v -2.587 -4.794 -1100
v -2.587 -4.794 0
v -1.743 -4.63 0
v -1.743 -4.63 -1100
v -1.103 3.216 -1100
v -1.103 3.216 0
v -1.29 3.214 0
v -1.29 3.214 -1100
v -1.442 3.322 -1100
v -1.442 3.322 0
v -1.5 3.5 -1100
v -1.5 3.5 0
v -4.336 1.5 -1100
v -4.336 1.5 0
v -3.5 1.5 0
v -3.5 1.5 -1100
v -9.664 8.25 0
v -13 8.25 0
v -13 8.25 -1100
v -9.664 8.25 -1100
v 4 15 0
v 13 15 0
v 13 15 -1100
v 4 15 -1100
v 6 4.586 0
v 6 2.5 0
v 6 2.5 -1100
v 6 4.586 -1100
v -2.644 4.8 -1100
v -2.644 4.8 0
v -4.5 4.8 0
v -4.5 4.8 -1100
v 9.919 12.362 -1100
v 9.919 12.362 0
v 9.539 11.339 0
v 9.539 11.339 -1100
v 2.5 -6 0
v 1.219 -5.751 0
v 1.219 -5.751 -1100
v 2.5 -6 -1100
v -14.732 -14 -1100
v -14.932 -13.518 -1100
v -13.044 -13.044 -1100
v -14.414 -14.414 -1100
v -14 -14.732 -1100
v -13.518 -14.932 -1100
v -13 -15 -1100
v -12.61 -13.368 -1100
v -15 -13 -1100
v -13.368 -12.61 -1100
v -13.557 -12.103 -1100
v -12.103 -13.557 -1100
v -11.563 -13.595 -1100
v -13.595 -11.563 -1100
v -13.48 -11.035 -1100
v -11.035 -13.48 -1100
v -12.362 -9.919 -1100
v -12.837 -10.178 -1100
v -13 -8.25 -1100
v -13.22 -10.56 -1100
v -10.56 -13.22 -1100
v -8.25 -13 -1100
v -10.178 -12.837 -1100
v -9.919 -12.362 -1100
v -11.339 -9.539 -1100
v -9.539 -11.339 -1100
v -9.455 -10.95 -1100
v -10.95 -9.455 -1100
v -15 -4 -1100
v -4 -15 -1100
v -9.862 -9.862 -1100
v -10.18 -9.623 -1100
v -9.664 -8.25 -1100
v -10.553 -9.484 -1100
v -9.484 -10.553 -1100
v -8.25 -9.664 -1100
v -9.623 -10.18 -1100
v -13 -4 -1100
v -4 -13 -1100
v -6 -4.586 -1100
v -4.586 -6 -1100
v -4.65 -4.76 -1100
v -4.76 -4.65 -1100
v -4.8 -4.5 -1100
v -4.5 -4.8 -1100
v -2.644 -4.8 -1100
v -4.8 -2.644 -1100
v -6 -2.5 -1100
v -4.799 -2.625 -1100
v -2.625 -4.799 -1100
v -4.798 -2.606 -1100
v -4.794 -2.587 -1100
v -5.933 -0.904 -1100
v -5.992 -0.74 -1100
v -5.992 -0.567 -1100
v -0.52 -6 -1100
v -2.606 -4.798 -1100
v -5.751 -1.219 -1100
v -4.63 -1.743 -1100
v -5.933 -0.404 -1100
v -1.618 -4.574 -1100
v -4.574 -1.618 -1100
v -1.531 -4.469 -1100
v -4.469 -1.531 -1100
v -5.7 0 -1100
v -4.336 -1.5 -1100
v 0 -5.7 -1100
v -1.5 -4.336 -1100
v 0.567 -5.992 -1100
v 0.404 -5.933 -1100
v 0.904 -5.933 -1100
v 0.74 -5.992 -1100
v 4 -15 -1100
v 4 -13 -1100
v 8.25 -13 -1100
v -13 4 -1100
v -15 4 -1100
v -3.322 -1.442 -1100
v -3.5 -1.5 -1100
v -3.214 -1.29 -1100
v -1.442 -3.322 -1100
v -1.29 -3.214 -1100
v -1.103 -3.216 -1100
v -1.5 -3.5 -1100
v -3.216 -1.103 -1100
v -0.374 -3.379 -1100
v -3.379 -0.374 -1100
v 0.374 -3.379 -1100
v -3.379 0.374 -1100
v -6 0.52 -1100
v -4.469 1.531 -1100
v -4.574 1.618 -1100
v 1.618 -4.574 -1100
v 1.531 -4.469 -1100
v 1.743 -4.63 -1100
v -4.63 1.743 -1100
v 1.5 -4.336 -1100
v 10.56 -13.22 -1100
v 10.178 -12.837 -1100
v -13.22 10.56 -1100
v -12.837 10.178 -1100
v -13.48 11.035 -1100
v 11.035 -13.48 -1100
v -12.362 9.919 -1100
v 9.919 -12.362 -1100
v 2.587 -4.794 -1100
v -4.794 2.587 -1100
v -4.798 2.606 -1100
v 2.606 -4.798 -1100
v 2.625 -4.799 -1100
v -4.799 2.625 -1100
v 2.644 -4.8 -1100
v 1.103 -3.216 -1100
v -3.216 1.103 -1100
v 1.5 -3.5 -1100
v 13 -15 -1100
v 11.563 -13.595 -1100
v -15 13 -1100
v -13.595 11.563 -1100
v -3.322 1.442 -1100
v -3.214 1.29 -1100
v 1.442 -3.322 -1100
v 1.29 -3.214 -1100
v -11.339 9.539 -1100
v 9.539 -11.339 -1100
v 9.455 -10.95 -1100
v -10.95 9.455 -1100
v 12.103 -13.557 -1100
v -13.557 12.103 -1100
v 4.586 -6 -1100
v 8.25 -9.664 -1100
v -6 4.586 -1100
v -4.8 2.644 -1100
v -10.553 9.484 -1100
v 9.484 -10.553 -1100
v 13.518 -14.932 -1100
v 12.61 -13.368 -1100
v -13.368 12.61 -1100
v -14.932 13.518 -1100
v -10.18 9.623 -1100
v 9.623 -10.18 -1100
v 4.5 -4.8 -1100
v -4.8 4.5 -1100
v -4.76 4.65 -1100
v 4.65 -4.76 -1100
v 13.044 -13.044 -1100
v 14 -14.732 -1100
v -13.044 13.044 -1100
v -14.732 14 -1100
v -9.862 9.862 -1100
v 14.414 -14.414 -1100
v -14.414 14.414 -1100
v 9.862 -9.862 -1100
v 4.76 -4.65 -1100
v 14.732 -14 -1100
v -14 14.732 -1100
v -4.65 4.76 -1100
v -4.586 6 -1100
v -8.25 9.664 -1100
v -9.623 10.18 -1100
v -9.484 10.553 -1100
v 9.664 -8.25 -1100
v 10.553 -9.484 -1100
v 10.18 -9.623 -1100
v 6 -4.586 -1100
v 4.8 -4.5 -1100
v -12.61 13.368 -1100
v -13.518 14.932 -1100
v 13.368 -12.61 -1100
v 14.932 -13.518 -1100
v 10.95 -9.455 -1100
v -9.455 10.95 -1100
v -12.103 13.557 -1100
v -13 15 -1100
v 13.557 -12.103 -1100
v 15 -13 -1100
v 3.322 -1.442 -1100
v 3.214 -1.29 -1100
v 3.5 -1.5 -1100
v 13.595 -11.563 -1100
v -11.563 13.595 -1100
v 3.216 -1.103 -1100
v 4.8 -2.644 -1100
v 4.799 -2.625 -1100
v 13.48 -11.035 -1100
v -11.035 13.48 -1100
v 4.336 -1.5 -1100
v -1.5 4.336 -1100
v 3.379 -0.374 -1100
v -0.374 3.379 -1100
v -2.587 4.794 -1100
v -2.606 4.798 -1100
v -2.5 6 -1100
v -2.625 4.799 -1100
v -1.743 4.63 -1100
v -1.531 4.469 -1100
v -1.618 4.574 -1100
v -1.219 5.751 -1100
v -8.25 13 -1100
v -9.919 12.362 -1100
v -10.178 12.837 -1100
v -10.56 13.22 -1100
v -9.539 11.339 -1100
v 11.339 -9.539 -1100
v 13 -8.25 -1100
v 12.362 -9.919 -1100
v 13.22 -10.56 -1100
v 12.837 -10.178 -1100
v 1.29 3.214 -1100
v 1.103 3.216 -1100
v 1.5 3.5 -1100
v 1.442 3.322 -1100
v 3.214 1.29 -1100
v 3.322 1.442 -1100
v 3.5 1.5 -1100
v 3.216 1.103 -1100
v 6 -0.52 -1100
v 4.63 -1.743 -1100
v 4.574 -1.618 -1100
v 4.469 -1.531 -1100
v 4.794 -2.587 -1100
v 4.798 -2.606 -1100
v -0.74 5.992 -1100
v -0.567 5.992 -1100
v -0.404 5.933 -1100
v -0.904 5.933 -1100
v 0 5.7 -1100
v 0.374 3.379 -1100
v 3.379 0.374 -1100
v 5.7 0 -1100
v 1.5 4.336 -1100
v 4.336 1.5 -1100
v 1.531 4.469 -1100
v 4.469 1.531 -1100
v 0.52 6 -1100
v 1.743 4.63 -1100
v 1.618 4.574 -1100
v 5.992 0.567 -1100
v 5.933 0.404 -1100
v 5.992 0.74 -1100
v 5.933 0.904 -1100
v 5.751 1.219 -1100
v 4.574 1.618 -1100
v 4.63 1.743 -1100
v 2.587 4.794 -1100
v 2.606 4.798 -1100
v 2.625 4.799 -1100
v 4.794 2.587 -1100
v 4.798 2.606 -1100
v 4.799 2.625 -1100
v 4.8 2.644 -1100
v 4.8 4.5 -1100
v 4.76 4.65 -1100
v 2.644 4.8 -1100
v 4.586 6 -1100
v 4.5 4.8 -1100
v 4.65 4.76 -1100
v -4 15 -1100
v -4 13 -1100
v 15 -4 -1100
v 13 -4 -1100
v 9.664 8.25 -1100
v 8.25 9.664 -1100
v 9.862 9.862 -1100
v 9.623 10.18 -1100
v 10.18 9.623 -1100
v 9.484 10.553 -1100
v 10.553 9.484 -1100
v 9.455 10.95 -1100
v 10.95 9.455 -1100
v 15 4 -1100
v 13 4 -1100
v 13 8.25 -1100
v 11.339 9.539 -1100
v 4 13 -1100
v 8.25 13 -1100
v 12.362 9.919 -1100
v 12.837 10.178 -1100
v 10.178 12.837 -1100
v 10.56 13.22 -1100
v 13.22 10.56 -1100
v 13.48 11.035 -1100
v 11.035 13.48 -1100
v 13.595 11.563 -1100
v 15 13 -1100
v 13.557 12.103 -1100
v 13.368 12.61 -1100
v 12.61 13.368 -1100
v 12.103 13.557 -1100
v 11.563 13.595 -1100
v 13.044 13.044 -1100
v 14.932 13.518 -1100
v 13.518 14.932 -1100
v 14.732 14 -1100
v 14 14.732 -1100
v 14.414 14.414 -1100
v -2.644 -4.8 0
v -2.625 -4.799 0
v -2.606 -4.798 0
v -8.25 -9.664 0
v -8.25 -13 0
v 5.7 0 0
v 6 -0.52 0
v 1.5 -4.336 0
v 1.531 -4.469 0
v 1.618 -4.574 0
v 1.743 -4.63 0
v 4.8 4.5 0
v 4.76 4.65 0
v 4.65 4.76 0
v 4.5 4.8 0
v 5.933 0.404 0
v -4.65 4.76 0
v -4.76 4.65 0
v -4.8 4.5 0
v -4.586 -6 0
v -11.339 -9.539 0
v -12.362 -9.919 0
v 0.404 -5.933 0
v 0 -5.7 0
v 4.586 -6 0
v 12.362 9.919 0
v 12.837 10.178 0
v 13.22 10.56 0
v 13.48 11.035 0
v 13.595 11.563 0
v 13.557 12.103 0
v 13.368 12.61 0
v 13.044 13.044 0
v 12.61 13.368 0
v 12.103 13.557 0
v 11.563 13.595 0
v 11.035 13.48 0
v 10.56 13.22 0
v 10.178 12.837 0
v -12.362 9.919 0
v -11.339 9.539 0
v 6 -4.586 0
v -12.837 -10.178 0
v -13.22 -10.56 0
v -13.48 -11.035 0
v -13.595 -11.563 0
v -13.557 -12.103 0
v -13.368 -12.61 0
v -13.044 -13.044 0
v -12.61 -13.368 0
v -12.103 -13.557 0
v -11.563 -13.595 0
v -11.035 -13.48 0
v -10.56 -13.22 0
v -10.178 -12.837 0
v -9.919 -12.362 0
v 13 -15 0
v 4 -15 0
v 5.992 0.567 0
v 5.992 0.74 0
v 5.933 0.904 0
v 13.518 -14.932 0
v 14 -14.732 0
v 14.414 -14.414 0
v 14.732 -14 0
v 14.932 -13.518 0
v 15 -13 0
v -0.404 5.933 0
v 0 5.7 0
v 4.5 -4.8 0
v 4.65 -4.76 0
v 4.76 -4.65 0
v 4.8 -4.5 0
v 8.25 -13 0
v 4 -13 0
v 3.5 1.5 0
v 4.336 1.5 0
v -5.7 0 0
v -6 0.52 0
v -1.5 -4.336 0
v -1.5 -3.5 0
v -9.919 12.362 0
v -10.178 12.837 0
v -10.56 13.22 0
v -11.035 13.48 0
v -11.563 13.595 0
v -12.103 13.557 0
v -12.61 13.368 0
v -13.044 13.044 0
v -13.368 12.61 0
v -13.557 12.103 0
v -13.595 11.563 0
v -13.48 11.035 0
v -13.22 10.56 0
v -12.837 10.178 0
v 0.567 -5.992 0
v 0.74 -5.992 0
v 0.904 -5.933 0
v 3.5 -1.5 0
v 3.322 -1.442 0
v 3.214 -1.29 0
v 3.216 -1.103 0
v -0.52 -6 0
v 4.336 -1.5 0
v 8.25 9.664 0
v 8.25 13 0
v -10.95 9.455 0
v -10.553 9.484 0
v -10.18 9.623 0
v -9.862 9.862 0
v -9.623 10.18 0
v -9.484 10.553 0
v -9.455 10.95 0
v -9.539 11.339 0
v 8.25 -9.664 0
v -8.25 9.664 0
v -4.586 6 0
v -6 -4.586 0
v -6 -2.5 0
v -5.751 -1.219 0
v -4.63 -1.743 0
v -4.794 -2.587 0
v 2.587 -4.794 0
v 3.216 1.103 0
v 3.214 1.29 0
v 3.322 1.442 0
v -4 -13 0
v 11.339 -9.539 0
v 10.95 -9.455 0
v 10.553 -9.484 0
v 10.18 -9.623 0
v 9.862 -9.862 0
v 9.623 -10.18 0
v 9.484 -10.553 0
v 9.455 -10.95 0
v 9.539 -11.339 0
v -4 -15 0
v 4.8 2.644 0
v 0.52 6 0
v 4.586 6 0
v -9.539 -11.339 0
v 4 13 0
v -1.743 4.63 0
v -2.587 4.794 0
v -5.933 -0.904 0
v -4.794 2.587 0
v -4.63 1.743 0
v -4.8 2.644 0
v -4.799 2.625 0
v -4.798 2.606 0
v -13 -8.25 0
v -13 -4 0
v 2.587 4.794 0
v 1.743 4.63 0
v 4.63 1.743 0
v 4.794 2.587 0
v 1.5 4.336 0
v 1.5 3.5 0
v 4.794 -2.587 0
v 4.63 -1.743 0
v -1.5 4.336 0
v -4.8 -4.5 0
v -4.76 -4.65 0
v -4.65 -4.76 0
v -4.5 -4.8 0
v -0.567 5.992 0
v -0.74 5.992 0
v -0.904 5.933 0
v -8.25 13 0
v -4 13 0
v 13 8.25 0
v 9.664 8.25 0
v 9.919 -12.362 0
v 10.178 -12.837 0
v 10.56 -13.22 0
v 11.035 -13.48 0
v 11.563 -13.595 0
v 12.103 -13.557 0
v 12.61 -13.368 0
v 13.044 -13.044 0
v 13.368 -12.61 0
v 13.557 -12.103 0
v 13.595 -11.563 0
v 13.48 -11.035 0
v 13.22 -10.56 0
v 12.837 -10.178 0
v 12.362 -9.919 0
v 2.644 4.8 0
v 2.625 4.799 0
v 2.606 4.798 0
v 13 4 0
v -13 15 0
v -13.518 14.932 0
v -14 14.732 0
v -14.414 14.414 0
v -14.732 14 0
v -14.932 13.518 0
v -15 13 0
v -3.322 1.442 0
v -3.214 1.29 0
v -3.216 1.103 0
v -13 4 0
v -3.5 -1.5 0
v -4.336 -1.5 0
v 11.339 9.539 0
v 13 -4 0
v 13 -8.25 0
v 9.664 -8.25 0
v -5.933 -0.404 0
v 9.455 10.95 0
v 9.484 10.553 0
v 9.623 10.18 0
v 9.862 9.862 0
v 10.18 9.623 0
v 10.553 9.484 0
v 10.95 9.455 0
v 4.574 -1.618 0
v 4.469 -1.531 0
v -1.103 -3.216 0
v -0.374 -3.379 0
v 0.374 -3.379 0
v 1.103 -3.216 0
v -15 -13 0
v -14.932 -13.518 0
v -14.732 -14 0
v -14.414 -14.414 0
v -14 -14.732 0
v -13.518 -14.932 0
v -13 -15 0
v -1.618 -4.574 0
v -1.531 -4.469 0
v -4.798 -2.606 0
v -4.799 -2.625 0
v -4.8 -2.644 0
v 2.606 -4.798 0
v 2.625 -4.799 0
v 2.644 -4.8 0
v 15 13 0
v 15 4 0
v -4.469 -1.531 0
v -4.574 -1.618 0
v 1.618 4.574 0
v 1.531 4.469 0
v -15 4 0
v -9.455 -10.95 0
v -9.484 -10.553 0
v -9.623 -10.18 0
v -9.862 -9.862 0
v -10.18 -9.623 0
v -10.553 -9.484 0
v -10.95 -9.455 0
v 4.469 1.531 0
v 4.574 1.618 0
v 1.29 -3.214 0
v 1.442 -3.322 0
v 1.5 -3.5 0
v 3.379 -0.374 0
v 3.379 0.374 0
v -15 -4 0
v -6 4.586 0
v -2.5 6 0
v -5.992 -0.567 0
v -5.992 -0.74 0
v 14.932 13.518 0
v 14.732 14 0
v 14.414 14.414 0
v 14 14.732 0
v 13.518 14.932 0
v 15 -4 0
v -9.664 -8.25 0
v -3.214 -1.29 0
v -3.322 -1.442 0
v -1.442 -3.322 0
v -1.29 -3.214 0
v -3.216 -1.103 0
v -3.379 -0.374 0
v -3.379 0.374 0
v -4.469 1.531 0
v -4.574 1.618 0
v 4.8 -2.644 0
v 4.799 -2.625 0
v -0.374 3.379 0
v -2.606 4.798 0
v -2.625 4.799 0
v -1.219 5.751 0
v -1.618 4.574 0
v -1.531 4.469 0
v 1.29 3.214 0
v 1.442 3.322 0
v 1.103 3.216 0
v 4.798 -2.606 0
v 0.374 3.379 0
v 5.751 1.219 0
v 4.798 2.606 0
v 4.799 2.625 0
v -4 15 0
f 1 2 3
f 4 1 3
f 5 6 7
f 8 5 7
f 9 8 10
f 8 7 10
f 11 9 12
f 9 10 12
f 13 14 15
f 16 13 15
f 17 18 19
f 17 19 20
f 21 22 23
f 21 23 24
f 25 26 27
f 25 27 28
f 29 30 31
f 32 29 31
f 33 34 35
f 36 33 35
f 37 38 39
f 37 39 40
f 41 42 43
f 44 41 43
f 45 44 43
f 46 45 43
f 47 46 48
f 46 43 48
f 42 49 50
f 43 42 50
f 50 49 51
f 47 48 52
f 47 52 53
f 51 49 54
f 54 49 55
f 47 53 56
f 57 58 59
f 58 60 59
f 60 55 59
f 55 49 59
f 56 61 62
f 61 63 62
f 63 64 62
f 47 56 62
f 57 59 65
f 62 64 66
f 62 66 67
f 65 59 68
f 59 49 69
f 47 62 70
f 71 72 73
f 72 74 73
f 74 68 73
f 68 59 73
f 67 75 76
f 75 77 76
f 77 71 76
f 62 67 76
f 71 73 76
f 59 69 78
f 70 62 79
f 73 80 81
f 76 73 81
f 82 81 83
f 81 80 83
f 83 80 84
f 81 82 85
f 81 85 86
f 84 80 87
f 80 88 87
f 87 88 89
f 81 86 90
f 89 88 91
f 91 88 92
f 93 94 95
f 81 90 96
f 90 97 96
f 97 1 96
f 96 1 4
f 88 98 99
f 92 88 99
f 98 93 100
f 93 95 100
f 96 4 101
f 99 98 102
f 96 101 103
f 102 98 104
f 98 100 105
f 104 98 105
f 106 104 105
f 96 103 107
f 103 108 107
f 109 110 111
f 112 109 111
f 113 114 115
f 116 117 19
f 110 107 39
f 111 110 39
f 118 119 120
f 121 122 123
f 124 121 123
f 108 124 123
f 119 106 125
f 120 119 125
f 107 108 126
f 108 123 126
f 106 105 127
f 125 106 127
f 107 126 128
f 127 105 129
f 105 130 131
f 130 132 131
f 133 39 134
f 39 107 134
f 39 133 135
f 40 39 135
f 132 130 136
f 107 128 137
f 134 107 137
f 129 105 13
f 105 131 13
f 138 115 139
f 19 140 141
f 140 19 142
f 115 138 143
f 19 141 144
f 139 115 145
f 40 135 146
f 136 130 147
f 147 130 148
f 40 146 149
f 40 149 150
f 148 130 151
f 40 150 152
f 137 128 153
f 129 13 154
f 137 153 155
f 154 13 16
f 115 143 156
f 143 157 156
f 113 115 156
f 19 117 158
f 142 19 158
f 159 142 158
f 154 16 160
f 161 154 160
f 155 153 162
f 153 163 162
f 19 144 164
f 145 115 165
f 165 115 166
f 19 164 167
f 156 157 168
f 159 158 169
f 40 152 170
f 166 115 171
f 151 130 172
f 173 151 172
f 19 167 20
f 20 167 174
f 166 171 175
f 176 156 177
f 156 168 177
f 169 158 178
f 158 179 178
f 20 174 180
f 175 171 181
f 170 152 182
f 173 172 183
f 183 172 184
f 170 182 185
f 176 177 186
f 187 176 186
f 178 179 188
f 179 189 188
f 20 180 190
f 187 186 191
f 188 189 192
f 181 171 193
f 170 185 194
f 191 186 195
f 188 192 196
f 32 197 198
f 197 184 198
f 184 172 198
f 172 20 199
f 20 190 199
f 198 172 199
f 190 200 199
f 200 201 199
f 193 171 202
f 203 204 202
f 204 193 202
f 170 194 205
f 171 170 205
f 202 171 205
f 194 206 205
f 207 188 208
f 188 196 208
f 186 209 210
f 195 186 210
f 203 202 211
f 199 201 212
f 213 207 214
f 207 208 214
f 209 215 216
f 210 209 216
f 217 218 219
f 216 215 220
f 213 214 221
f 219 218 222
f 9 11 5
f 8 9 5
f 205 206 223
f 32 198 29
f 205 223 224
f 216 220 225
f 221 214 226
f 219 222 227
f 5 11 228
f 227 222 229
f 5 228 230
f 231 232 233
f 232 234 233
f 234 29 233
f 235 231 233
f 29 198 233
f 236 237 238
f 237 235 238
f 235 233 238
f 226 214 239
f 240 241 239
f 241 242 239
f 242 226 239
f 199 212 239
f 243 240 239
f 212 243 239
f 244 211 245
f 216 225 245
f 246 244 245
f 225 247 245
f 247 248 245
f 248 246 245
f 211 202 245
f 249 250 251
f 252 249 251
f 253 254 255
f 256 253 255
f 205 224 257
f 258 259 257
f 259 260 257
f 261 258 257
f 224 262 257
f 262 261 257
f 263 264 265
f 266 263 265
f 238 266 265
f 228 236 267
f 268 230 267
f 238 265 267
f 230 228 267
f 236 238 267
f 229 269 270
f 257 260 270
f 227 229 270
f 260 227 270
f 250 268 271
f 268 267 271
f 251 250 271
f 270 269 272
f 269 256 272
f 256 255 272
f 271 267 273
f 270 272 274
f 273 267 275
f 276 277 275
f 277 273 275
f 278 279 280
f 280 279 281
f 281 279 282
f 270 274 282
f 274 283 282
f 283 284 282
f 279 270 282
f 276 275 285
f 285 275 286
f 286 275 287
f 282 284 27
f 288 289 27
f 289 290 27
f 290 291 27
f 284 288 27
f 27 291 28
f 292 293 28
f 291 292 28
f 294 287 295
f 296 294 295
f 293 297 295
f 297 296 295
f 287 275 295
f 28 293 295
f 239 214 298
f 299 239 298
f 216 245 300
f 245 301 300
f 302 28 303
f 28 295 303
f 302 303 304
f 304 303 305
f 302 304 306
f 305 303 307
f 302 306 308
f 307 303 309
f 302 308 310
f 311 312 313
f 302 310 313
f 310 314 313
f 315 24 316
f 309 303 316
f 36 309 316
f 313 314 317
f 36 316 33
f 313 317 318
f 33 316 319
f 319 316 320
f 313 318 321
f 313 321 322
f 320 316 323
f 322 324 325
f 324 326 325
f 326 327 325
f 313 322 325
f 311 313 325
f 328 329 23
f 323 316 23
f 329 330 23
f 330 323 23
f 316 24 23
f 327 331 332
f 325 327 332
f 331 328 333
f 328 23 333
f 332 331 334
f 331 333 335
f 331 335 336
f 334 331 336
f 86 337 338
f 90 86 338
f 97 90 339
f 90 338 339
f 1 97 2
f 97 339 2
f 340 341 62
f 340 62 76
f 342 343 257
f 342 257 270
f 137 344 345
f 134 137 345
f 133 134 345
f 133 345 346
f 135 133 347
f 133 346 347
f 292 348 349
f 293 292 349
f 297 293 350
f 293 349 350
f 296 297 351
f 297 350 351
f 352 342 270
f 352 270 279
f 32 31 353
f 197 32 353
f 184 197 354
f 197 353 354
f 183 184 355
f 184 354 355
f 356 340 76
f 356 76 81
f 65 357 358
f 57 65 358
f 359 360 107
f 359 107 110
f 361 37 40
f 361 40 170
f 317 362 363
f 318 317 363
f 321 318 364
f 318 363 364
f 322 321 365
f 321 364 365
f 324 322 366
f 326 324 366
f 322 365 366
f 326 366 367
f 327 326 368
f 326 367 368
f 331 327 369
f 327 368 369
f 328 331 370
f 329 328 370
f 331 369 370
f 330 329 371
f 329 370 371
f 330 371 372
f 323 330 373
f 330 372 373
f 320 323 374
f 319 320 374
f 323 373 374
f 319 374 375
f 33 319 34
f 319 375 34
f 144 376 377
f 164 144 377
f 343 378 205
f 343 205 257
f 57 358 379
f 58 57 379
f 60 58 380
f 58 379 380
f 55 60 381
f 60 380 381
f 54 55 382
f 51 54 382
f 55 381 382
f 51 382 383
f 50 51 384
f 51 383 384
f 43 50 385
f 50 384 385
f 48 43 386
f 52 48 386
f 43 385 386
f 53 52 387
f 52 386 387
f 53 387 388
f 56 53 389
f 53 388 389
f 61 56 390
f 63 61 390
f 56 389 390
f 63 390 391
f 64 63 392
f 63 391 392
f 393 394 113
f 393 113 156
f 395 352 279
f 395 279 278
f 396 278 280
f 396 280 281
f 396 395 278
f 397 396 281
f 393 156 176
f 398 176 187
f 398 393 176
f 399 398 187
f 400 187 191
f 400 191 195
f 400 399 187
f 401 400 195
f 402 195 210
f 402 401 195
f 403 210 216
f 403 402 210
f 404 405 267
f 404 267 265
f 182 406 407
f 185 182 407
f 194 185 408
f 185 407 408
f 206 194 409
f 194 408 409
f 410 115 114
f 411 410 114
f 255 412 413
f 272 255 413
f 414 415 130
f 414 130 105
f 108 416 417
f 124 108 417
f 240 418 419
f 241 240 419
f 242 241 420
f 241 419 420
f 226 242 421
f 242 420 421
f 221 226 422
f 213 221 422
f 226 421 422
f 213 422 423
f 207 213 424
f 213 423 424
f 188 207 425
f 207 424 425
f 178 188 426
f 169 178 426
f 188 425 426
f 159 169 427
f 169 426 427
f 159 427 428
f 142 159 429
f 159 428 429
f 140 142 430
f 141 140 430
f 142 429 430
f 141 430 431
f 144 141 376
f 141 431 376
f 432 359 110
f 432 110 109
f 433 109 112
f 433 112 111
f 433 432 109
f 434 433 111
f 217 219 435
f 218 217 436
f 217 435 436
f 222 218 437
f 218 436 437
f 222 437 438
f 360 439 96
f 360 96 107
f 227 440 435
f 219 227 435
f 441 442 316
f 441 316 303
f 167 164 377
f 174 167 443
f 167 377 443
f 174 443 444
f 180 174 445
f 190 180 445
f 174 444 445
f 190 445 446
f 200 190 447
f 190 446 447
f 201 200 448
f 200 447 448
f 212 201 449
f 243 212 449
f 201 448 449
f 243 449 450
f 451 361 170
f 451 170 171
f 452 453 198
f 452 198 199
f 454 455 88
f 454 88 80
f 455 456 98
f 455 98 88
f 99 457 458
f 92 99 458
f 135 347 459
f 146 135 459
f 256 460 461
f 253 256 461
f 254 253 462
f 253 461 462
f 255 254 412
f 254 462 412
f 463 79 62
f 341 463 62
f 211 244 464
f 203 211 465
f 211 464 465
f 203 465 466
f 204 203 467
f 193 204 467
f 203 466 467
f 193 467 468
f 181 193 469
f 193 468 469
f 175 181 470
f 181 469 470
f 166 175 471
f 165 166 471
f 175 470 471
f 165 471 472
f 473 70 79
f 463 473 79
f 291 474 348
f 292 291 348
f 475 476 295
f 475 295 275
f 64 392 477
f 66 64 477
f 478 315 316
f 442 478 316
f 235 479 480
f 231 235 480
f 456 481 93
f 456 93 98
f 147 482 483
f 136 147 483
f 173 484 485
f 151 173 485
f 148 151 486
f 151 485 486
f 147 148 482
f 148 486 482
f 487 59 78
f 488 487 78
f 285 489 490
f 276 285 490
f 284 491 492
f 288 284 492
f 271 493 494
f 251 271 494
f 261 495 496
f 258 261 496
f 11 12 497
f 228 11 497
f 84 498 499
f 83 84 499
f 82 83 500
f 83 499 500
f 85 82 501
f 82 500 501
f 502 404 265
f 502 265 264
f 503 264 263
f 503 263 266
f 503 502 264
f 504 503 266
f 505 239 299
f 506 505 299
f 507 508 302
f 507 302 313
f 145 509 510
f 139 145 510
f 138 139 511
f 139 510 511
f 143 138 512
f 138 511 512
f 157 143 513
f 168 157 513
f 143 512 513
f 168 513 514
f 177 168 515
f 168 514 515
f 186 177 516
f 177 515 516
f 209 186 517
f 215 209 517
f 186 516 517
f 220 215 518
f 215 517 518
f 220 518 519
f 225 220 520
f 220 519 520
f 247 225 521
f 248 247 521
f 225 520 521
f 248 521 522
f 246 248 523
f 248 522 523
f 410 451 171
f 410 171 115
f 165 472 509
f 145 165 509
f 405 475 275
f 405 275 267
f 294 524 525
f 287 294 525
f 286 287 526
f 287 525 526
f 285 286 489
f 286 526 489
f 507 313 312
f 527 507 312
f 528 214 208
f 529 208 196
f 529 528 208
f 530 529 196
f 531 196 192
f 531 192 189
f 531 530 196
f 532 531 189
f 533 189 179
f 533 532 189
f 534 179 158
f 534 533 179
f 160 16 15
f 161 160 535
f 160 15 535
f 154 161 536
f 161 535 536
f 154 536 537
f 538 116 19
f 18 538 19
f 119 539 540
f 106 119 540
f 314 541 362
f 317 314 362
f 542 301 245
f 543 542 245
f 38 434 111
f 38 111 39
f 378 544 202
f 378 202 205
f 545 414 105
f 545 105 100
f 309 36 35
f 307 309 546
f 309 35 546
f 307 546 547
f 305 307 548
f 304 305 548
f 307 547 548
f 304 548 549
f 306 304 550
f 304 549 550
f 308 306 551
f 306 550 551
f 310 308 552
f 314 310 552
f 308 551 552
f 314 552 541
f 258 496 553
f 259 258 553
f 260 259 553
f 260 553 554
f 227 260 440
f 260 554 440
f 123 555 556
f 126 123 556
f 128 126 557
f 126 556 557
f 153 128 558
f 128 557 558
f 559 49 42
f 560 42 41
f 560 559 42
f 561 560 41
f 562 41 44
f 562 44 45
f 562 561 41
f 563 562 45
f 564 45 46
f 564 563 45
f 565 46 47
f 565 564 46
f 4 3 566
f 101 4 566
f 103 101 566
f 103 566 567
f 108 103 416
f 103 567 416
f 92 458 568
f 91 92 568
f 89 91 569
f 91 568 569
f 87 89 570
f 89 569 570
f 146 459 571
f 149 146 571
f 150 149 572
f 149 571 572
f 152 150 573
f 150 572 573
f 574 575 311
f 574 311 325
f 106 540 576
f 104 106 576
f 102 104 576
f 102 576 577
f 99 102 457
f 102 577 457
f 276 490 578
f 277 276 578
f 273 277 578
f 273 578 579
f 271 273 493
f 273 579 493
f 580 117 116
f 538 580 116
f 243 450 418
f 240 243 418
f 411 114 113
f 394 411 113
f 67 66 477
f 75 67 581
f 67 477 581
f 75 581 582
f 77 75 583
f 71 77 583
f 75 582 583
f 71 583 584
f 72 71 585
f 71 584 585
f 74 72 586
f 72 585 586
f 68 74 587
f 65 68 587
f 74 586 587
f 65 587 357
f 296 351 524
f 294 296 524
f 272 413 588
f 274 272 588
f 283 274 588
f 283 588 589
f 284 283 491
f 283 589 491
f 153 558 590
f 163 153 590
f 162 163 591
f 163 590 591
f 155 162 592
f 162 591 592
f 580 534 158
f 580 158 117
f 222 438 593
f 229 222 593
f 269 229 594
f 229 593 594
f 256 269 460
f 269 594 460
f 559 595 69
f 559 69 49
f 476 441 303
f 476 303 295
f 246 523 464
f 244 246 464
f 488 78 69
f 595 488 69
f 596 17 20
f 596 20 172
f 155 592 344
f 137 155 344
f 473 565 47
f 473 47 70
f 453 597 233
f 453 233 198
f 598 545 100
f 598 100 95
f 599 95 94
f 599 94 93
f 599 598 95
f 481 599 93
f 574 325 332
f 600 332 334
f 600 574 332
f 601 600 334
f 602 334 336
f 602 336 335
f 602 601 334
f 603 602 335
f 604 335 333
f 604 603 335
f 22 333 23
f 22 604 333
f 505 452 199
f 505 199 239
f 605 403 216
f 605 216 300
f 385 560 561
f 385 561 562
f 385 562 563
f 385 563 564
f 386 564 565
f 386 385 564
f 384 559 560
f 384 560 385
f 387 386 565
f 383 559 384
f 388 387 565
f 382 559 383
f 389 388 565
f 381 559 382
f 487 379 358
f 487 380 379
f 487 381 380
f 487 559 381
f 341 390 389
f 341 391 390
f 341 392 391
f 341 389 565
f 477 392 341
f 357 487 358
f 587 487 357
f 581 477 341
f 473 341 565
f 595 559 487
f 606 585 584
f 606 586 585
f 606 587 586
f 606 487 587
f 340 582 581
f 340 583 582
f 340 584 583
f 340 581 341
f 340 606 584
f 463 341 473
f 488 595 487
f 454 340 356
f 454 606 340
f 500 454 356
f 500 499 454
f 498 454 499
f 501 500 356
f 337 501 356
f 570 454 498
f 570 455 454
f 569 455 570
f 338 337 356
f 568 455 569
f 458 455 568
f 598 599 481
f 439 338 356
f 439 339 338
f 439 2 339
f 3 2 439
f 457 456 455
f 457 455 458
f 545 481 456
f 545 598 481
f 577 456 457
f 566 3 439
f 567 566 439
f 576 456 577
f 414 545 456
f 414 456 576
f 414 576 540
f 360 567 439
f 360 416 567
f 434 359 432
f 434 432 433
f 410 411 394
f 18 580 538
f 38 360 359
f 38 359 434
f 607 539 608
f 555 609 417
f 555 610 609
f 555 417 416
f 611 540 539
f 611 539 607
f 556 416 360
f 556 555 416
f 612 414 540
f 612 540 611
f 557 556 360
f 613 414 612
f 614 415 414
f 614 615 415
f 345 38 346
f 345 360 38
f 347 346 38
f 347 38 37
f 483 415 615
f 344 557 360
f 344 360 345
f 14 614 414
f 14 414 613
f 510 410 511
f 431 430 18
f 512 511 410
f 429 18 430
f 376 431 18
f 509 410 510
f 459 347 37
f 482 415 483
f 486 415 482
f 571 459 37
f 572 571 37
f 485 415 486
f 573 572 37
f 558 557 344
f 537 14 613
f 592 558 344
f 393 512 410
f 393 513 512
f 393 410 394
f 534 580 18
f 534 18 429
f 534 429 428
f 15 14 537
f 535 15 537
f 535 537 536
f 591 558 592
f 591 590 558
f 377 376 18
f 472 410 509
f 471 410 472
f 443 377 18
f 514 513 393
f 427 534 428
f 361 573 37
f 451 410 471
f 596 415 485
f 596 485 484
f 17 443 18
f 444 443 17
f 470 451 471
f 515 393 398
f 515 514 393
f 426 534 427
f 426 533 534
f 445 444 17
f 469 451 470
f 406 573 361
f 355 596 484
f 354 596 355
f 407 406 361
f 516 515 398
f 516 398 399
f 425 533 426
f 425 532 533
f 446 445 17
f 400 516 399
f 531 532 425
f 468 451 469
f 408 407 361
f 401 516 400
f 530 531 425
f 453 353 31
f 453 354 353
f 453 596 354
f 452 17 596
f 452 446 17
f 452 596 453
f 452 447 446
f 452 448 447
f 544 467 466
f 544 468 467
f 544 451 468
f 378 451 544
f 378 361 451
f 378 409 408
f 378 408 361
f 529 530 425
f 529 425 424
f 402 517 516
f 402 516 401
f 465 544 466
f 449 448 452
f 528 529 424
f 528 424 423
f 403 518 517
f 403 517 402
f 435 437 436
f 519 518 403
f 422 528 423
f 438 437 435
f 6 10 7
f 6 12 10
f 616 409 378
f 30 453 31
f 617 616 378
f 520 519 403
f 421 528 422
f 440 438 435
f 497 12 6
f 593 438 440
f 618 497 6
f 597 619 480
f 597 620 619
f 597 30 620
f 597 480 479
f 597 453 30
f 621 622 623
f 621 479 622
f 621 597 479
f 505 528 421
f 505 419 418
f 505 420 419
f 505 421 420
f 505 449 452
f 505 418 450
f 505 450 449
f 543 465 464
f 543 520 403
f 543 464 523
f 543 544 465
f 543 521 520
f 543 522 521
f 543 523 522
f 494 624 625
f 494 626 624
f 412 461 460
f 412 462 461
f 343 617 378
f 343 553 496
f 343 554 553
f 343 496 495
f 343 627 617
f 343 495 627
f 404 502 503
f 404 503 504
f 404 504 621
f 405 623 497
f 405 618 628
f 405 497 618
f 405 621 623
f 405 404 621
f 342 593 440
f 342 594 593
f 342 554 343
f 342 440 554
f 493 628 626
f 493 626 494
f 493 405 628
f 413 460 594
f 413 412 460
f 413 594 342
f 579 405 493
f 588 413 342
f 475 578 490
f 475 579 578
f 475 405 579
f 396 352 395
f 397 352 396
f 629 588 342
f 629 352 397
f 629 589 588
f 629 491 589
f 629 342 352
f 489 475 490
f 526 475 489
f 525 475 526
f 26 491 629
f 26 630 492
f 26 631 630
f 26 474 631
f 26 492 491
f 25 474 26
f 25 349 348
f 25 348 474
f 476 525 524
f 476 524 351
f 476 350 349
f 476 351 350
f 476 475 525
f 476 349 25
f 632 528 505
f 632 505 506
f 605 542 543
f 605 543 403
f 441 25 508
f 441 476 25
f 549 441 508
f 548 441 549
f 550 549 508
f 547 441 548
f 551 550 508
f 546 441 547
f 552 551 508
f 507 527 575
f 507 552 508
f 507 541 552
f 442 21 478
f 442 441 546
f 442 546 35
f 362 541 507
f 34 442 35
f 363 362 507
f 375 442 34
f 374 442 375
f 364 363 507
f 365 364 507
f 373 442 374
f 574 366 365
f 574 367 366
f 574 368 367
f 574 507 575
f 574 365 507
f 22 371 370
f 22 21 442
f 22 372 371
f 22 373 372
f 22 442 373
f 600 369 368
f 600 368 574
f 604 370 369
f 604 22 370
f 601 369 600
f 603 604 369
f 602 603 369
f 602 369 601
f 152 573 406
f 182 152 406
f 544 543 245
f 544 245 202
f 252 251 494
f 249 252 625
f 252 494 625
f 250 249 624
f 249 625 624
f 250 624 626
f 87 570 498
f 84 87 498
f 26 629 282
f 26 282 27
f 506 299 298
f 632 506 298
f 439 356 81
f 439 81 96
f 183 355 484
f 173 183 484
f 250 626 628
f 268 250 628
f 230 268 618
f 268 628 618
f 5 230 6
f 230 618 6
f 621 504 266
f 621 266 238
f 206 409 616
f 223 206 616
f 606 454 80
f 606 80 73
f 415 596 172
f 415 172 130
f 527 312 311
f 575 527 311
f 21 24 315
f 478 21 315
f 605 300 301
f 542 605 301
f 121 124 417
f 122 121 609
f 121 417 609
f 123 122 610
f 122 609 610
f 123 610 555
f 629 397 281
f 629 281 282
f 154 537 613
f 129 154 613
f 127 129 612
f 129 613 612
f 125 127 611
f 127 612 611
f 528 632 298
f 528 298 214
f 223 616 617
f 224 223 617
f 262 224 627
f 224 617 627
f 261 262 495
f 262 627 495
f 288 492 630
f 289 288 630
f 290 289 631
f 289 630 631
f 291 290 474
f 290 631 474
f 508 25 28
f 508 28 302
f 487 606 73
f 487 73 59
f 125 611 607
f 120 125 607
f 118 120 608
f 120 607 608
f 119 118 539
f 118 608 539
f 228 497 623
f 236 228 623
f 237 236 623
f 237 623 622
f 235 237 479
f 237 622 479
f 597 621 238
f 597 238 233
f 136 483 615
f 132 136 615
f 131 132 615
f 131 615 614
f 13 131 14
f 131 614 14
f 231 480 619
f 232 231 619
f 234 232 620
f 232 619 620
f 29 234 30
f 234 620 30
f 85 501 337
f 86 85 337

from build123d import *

# Parameters (mm, degrees)
BOSS_EXTRUDE1_DEPTH = 1100
CUT_EXTRUDE1_DEPTH  = 1101.20452644


with BuildPart() as part:
    # Sketch1 → Boss-Extrude1 (new body)
    with BuildSketch(Plane.XY):
        with BuildLine():
            Line((-15, 4), (-13, 4))
            Line((-13, 4), (-13, 8.25))
            Line((-13, 8.25), (-9.664213562, 8.25))
            Line((-9.664213562, 8.25), (-6, 4.585786438))
            Line((-6, 4.585786438), (-6, 0.519615242))
            Line((-6, 0.519615242), (-5.7, 0))
            Line((-5.7, 0), (-5.933012702, -0.403589838))
            ThreePointArc((-5.933012702, -0.403589838), (-6, -0.653589838), (-5.933012702, -0.903589838))
            Line((-5.933012702, -0.903589838), (-5.750976592, -1.218885629))
            Line((-5.750976592, -1.218885629), (-6, -2.5))
            Line((-6, -2.5), (-6, -4.585786438))
            Line((-6, -4.585786438), (-9.664213562, -8.25))
            Line((-9.664213562, -8.25), (-13, -8.25))
            Line((-13, -8.25), (-13, -4))
            Line((-13, -4), (-15, -4))
            Line((-15, -4), (-15, -13))
            ThreePointArc((-15, -13), (-14.414213562, -14.414213562), (-13, -15))
            Line((-13, -15), (-4, -15))
            Line((-4, -15), (-4, -13))
            Line((-4, -13), (-8.25, -13))
            Line((-8.25, -13), (-8.25, -9.664213562))
            Line((-8.25, -9.664213562), (-4.585786438, -6))
            Line((-4.585786438, -6), (-0.519615242, -6))
            Line((-0.519615242, -6), (0, -5.7))
            Line((0, -5.7), (0.403589838, -5.933012702))
            ThreePointArc((0.403589838, -5.933012702), (0.653589838, -6), (0.903589838, -5.933012702))
            Line((0.903589838, -5.933012702), (1.218885629, -5.750976592))
            Line((1.218885629, -5.750976592), (2.5, -6))
            Line((2.5, -6), (4.585786438, -6))
            Line((4.585786438, -6), (8.25, -9.664213562))
            Line((8.25, -9.664213562), (8.25, -13))
            Line((8.25, -13), (4, -13))
            Line((4, -13), (4, -15))
            Line((4, -15), (13, -15))
            ThreePointArc((13, -15), (14.414213562, -14.414213562), (15, -13))
            Line((15, -13), (15, -4))
            Line((15, -4), (13, -4))
            Line((13, -4), (13, -8.25))
            Line((13, -8.25), (9.664213562, -8.25))
            Line((9.664213562, -8.25), (6, -4.585786438))
            Line((6, -4.585786438), (6, -0.519615242))
            Line((6, -0.519615242), (5.7, 0))
            Line((5.7, 0), (5.933012702, 0.403589838))
            ThreePointArc((5.933012702, 0.403589838), (6, 0.653589838), (5.933012702, 0.903589838))
            Line((5.933012702, 0.903589838), (5.750976592, 1.218885629))
            Line((5.750976592, 1.218885629), (6, 2.5))
            Line((6, 2.5), (6, 4.585786438))
            Line((6, 4.585786438), (9.664213562, 8.25))
            Line((9.664213562, 8.25), (13, 8.25))
            Line((13, 8.25), (13, 4))
            Line((13, 4), (15, 4))
            Line((15, 4), (15, 13))
            ThreePointArc((15, 13), (14.414213562, 14.414213562), (13, 15))
            Line((13, 15), (4, 15))
            Line((4, 15), (4, 13))
            Line((4, 13), (8.25, 13))
            Line((8.25, 13), (8.25, 9.664213562))
            Line((8.25, 9.664213562), (4.585786438, 6))
            Line((4.585786438, 6), (0.519615242, 6))
            Line((0.519615242, 6), (0, 5.7))
            Line((0, 5.7), (-0.403589838, 5.933012702))
            ThreePointArc((-0.403589838, 5.933012702), (-0.653589838, 6), (-0.903589838, 5.933012702))
            Line((-0.903589838, 5.933012702), (-1.218885629, 5.750976592))
            Line((-1.218885629, 5.750976592), (-2.5, 6))
            Line((-2.5, 6), (-4.585786438, 6))
            Line((-4.585786438, 6), (-8.25, 9.664213562))
            Line((-8.25, 9.664213562), (-8.25, 13))
            Line((-8.25, 13), (-4, 13))
            Line((-4, 13), (-4, 15))
            Line((-4, 15), (-13, 15))
            ThreePointArc((-13, 15), (-14.414213562, 14.414213562), (-15, 13))
            Line((-15, 13), (-15, 4))
        make_face()
        with BuildLine():
            Line((11.338915743, 9.539070071), (12.361530981, 9.918883282))
            ThreePointArc((12.361530981, 9.918883282), (13.043502884, 13.043502884), (9.918883282, 12.361530981))
            Line((9.918883282, 12.361530981), (9.539070071, 11.338915743))
            ThreePointArc((9.539070071, 11.338915743), (9.861522369, 9.861522369), (11.338915743, 9.539070071))
        make_face(mode=Mode.SUBTRACT)
        with BuildLine():
            Line((9.539070071, -11.338915743), (9.918883282, -12.361530981))
            ThreePointArc((9.918883282, -12.361530981), (13.043502884, -13.043502884), (12.361530981, -9.918883282))
            Line((12.361530981, -9.918883282), (11.338915743, -9.539070071))
            ThreePointArc((11.338915743, -9.539070071), (9.861522369, -9.861522369), (9.539070071, -11.338915743))
        make_face(mode=Mode.SUBTRACT)
        with BuildLine():
            Line((-12.361530981, 9.918883282), (-11.338915743, 9.539070071))
            ThreePointArc((-11.338915743, 9.539070071), (-9.861522369, 9.861522369), (-9.539070071, 11.338915743))
            Line((-9.539070071, 11.338915743), (-9.918883282, 12.361530981))
            ThreePointArc((-9.918883282, 12.361530981), (-13.043502884, 13.043502884), (-12.361530981, 9.918883282))
        make_face(mode=Mode.SUBTRACT)
        with BuildLine():
            Line((-9.918883282, -12.361530981), (-9.539070071, -11.338915743))
            ThreePointArc((-9.539070071, -11.338915743), (-9.861522369, -9.861522369), (-11.338915743, -9.539070071))
            Line((-11.338915743, -9.539070071), (-12.361530981, -9.918883282))
            ThreePointArc((-12.361530981, -9.918883282), (-13.043502884, -13.043502884), (-9.918883282, -12.361530981))
        make_face(mode=Mode.SUBTRACT)
    extrude(amount=-BOSS_EXTRUDE1_DEPTH)

    # Sketch2 → Cut-Extrude1 (cut, through all)
    with BuildSketch(Plane.XY):
        with BuildLine():
            Line((-4.5, -4.8), (-2.644433572, -4.8))
            ThreePointArc((-2.644433572, -4.8), (-2.615679847, -4.79861886), (-2.587190874, -4.794488155))
            Line((-2.587190874, -4.794488155), (-1.742757301, -4.630346896))
            ThreePointArc((-1.742757301, -4.630346896), (-1.568512625, -4.526682207), (-1.5, -4.335858741))
            Line((-1.5, -4.335858741), (-1.5, -3.5))
            ThreePointArc((-1.5, -3.5), (-1.374371466, -3.255879964), (-1.10270272, -3.21621621))
            ThreePointArc((-1.10270272, -3.21621621), (-9e-09, -3.4), (1.102702703, -3.216216216))
            ThreePointArc((1.102702703, -3.216216216), (1.374371458, -3.255879959), (1.5, -3.5))
            Line((1.5, -3.5), (1.5, -4.335858741))
            ThreePointArc((1.5, -4.335858741), (1.568512625, -4.526682207), (1.742757301, -4.630346896))
            Line((1.742757301, -4.630346896), (2.587190874, -4.794488155))
            ThreePointArc((2.587190874, -4.794488155), (2.615679847, -4.79861886), (2.644433572, -4.8))
            Line((2.644433572, -4.8), (4.5, -4.8))
            ThreePointArc((4.5, -4.8), (4.712132034, -4.712132034), (4.8, -4.5))
            Line((4.8, -4.5), (4.8, -2.644433572))
            ThreePointArc((4.8, -2.644433572), (4.79861886, -2.615679847), (4.794488155, -2.587190874))
            Line((4.794488155, -2.587190874), (4.630346896, -1.742757301))
            ThreePointArc((4.630346896, -1.742757301), (4.526682207, -1.568512625), (4.335858741, -1.5))
            Line((4.335858741, -1.5), (3.5, -1.5))
            ThreePointArc((3.5, -1.5), (3.255879964, -1.374371466), (3.21621621, -1.10270272))
            ThreePointArc((3.21621621, -1.10270272), (3.4, -9e-09), (3.216216216, 1.102702703))
            ThreePointArc((3.216216216, 1.102702703), (3.255879959, 1.374371458), (3.5, 1.5))
            Line((3.5, 1.5), (4.335858741, 1.5))
            ThreePointArc((4.335858741, 1.5), (4.526682207, 1.568512625), (4.630346896, 1.742757301))
            Line((4.630346896, 1.742757301), (4.794488155, 2.587190874))
            ThreePointArc((4.794488155, 2.587190874), (4.79861886, 2.615679847), (4.8, 2.644433572))
            Line((4.8, 2.644433572), (4.8, 4.5))
            ThreePointArc((4.8, 4.5), (4.712132034, 4.712132034), (4.5, 4.8))
            Line((4.5, 4.8), (2.644433572, 4.8))
            ThreePointArc((2.644433572, 4.8), (2.615679847, 4.79861886), (2.587190874, 4.794488155))
            Line((2.587190874, 4.794488155), (1.742757301, 4.630346896))
            ThreePointArc((1.742757301, 4.630346896), (1.568512625, 4.526682207), (1.5, 4.335858741))
            Line((1.5, 4.335858741), (1.5, 3.5))
            ThreePointArc((1.5, 3.5), (1.374371466, 3.255879964), (1.10270272, 3.21621621))
            ThreePointArc((1.10270272, 3.21621621), (9e-09, 3.4), (-1.102702703, 3.216216216))
            ThreePointArc((-1.102702703, 3.216216216), (-1.374371458, 3.255879959), (-1.5, 3.5))
            Line((-1.5, 3.5), (-1.5, 4.335858741))
            ThreePointArc((-1.5, 4.335858741), (-1.568512625, 4.526682207), (-1.742757301, 4.630346896))
            Line((-1.742757301, 4.630346896), (-2.587190874, 4.794488155))
            ThreePointArc((-2.587190874, 4.794488155), (-2.615679847, 4.79861886), (-2.644433572, 4.8))
            Line((-2.644433572, 4.8), (-4.5, 4.8))
            ThreePointArc((-4.5, 4.8), (-4.712132034, 4.712132034), (-4.8, 4.5))
            Line((-4.8, 4.5), (-4.8, 2.644433572))
            ThreePointArc((-4.8, 2.644433572), (-4.79861886, 2.615679847), (-4.794488155, 2.587190874))
            Line((-4.794488155, 2.587190874), (-4.630346896, 1.742757301))
            ThreePointArc((-4.630346896, 1.742757301), (-4.526682207, 1.568512625), (-4.335858741, 1.5))
            Line((-4.335858741, 1.5), (-3.5, 1.5))
            ThreePointArc((-3.5, 1.5), (-3.255879964, 1.374371466), (-3.21621621, 1.10270272))
            ThreePointArc((-3.21621621, 1.10270272), (-3.4, 9e-09), (-3.216216216, -1.102702703))
            ThreePointArc((-3.216216216, -1.102702703), (-3.255879959, -1.374371458), (-3.5, -1.5))
            Line((-3.5, -1.5), (-4.335858741, -1.5))
            ThreePointArc((-4.335858741, -1.5), (-4.526682207, -1.568512625), (-4.630346896, -1.742757301))
            Line((-4.630346896, -1.742757301), (-4.794488155, -2.587190874))
            ThreePointArc((-4.794488155, -2.587190874), (-4.79861886, -2.615679847), (-4.8, -2.644433572))
            Line((-4.8, -2.644433572), (-4.8, -4.5))
            ThreePointArc((-4.8, -4.5), (-4.712132034, -4.712132034), (-4.5, -4.8))
        make_face()
    extrude(amount=-CUT_EXTRUDE1_DEPTH, mode=Mode.SUBTRACT)


solid = part.part
